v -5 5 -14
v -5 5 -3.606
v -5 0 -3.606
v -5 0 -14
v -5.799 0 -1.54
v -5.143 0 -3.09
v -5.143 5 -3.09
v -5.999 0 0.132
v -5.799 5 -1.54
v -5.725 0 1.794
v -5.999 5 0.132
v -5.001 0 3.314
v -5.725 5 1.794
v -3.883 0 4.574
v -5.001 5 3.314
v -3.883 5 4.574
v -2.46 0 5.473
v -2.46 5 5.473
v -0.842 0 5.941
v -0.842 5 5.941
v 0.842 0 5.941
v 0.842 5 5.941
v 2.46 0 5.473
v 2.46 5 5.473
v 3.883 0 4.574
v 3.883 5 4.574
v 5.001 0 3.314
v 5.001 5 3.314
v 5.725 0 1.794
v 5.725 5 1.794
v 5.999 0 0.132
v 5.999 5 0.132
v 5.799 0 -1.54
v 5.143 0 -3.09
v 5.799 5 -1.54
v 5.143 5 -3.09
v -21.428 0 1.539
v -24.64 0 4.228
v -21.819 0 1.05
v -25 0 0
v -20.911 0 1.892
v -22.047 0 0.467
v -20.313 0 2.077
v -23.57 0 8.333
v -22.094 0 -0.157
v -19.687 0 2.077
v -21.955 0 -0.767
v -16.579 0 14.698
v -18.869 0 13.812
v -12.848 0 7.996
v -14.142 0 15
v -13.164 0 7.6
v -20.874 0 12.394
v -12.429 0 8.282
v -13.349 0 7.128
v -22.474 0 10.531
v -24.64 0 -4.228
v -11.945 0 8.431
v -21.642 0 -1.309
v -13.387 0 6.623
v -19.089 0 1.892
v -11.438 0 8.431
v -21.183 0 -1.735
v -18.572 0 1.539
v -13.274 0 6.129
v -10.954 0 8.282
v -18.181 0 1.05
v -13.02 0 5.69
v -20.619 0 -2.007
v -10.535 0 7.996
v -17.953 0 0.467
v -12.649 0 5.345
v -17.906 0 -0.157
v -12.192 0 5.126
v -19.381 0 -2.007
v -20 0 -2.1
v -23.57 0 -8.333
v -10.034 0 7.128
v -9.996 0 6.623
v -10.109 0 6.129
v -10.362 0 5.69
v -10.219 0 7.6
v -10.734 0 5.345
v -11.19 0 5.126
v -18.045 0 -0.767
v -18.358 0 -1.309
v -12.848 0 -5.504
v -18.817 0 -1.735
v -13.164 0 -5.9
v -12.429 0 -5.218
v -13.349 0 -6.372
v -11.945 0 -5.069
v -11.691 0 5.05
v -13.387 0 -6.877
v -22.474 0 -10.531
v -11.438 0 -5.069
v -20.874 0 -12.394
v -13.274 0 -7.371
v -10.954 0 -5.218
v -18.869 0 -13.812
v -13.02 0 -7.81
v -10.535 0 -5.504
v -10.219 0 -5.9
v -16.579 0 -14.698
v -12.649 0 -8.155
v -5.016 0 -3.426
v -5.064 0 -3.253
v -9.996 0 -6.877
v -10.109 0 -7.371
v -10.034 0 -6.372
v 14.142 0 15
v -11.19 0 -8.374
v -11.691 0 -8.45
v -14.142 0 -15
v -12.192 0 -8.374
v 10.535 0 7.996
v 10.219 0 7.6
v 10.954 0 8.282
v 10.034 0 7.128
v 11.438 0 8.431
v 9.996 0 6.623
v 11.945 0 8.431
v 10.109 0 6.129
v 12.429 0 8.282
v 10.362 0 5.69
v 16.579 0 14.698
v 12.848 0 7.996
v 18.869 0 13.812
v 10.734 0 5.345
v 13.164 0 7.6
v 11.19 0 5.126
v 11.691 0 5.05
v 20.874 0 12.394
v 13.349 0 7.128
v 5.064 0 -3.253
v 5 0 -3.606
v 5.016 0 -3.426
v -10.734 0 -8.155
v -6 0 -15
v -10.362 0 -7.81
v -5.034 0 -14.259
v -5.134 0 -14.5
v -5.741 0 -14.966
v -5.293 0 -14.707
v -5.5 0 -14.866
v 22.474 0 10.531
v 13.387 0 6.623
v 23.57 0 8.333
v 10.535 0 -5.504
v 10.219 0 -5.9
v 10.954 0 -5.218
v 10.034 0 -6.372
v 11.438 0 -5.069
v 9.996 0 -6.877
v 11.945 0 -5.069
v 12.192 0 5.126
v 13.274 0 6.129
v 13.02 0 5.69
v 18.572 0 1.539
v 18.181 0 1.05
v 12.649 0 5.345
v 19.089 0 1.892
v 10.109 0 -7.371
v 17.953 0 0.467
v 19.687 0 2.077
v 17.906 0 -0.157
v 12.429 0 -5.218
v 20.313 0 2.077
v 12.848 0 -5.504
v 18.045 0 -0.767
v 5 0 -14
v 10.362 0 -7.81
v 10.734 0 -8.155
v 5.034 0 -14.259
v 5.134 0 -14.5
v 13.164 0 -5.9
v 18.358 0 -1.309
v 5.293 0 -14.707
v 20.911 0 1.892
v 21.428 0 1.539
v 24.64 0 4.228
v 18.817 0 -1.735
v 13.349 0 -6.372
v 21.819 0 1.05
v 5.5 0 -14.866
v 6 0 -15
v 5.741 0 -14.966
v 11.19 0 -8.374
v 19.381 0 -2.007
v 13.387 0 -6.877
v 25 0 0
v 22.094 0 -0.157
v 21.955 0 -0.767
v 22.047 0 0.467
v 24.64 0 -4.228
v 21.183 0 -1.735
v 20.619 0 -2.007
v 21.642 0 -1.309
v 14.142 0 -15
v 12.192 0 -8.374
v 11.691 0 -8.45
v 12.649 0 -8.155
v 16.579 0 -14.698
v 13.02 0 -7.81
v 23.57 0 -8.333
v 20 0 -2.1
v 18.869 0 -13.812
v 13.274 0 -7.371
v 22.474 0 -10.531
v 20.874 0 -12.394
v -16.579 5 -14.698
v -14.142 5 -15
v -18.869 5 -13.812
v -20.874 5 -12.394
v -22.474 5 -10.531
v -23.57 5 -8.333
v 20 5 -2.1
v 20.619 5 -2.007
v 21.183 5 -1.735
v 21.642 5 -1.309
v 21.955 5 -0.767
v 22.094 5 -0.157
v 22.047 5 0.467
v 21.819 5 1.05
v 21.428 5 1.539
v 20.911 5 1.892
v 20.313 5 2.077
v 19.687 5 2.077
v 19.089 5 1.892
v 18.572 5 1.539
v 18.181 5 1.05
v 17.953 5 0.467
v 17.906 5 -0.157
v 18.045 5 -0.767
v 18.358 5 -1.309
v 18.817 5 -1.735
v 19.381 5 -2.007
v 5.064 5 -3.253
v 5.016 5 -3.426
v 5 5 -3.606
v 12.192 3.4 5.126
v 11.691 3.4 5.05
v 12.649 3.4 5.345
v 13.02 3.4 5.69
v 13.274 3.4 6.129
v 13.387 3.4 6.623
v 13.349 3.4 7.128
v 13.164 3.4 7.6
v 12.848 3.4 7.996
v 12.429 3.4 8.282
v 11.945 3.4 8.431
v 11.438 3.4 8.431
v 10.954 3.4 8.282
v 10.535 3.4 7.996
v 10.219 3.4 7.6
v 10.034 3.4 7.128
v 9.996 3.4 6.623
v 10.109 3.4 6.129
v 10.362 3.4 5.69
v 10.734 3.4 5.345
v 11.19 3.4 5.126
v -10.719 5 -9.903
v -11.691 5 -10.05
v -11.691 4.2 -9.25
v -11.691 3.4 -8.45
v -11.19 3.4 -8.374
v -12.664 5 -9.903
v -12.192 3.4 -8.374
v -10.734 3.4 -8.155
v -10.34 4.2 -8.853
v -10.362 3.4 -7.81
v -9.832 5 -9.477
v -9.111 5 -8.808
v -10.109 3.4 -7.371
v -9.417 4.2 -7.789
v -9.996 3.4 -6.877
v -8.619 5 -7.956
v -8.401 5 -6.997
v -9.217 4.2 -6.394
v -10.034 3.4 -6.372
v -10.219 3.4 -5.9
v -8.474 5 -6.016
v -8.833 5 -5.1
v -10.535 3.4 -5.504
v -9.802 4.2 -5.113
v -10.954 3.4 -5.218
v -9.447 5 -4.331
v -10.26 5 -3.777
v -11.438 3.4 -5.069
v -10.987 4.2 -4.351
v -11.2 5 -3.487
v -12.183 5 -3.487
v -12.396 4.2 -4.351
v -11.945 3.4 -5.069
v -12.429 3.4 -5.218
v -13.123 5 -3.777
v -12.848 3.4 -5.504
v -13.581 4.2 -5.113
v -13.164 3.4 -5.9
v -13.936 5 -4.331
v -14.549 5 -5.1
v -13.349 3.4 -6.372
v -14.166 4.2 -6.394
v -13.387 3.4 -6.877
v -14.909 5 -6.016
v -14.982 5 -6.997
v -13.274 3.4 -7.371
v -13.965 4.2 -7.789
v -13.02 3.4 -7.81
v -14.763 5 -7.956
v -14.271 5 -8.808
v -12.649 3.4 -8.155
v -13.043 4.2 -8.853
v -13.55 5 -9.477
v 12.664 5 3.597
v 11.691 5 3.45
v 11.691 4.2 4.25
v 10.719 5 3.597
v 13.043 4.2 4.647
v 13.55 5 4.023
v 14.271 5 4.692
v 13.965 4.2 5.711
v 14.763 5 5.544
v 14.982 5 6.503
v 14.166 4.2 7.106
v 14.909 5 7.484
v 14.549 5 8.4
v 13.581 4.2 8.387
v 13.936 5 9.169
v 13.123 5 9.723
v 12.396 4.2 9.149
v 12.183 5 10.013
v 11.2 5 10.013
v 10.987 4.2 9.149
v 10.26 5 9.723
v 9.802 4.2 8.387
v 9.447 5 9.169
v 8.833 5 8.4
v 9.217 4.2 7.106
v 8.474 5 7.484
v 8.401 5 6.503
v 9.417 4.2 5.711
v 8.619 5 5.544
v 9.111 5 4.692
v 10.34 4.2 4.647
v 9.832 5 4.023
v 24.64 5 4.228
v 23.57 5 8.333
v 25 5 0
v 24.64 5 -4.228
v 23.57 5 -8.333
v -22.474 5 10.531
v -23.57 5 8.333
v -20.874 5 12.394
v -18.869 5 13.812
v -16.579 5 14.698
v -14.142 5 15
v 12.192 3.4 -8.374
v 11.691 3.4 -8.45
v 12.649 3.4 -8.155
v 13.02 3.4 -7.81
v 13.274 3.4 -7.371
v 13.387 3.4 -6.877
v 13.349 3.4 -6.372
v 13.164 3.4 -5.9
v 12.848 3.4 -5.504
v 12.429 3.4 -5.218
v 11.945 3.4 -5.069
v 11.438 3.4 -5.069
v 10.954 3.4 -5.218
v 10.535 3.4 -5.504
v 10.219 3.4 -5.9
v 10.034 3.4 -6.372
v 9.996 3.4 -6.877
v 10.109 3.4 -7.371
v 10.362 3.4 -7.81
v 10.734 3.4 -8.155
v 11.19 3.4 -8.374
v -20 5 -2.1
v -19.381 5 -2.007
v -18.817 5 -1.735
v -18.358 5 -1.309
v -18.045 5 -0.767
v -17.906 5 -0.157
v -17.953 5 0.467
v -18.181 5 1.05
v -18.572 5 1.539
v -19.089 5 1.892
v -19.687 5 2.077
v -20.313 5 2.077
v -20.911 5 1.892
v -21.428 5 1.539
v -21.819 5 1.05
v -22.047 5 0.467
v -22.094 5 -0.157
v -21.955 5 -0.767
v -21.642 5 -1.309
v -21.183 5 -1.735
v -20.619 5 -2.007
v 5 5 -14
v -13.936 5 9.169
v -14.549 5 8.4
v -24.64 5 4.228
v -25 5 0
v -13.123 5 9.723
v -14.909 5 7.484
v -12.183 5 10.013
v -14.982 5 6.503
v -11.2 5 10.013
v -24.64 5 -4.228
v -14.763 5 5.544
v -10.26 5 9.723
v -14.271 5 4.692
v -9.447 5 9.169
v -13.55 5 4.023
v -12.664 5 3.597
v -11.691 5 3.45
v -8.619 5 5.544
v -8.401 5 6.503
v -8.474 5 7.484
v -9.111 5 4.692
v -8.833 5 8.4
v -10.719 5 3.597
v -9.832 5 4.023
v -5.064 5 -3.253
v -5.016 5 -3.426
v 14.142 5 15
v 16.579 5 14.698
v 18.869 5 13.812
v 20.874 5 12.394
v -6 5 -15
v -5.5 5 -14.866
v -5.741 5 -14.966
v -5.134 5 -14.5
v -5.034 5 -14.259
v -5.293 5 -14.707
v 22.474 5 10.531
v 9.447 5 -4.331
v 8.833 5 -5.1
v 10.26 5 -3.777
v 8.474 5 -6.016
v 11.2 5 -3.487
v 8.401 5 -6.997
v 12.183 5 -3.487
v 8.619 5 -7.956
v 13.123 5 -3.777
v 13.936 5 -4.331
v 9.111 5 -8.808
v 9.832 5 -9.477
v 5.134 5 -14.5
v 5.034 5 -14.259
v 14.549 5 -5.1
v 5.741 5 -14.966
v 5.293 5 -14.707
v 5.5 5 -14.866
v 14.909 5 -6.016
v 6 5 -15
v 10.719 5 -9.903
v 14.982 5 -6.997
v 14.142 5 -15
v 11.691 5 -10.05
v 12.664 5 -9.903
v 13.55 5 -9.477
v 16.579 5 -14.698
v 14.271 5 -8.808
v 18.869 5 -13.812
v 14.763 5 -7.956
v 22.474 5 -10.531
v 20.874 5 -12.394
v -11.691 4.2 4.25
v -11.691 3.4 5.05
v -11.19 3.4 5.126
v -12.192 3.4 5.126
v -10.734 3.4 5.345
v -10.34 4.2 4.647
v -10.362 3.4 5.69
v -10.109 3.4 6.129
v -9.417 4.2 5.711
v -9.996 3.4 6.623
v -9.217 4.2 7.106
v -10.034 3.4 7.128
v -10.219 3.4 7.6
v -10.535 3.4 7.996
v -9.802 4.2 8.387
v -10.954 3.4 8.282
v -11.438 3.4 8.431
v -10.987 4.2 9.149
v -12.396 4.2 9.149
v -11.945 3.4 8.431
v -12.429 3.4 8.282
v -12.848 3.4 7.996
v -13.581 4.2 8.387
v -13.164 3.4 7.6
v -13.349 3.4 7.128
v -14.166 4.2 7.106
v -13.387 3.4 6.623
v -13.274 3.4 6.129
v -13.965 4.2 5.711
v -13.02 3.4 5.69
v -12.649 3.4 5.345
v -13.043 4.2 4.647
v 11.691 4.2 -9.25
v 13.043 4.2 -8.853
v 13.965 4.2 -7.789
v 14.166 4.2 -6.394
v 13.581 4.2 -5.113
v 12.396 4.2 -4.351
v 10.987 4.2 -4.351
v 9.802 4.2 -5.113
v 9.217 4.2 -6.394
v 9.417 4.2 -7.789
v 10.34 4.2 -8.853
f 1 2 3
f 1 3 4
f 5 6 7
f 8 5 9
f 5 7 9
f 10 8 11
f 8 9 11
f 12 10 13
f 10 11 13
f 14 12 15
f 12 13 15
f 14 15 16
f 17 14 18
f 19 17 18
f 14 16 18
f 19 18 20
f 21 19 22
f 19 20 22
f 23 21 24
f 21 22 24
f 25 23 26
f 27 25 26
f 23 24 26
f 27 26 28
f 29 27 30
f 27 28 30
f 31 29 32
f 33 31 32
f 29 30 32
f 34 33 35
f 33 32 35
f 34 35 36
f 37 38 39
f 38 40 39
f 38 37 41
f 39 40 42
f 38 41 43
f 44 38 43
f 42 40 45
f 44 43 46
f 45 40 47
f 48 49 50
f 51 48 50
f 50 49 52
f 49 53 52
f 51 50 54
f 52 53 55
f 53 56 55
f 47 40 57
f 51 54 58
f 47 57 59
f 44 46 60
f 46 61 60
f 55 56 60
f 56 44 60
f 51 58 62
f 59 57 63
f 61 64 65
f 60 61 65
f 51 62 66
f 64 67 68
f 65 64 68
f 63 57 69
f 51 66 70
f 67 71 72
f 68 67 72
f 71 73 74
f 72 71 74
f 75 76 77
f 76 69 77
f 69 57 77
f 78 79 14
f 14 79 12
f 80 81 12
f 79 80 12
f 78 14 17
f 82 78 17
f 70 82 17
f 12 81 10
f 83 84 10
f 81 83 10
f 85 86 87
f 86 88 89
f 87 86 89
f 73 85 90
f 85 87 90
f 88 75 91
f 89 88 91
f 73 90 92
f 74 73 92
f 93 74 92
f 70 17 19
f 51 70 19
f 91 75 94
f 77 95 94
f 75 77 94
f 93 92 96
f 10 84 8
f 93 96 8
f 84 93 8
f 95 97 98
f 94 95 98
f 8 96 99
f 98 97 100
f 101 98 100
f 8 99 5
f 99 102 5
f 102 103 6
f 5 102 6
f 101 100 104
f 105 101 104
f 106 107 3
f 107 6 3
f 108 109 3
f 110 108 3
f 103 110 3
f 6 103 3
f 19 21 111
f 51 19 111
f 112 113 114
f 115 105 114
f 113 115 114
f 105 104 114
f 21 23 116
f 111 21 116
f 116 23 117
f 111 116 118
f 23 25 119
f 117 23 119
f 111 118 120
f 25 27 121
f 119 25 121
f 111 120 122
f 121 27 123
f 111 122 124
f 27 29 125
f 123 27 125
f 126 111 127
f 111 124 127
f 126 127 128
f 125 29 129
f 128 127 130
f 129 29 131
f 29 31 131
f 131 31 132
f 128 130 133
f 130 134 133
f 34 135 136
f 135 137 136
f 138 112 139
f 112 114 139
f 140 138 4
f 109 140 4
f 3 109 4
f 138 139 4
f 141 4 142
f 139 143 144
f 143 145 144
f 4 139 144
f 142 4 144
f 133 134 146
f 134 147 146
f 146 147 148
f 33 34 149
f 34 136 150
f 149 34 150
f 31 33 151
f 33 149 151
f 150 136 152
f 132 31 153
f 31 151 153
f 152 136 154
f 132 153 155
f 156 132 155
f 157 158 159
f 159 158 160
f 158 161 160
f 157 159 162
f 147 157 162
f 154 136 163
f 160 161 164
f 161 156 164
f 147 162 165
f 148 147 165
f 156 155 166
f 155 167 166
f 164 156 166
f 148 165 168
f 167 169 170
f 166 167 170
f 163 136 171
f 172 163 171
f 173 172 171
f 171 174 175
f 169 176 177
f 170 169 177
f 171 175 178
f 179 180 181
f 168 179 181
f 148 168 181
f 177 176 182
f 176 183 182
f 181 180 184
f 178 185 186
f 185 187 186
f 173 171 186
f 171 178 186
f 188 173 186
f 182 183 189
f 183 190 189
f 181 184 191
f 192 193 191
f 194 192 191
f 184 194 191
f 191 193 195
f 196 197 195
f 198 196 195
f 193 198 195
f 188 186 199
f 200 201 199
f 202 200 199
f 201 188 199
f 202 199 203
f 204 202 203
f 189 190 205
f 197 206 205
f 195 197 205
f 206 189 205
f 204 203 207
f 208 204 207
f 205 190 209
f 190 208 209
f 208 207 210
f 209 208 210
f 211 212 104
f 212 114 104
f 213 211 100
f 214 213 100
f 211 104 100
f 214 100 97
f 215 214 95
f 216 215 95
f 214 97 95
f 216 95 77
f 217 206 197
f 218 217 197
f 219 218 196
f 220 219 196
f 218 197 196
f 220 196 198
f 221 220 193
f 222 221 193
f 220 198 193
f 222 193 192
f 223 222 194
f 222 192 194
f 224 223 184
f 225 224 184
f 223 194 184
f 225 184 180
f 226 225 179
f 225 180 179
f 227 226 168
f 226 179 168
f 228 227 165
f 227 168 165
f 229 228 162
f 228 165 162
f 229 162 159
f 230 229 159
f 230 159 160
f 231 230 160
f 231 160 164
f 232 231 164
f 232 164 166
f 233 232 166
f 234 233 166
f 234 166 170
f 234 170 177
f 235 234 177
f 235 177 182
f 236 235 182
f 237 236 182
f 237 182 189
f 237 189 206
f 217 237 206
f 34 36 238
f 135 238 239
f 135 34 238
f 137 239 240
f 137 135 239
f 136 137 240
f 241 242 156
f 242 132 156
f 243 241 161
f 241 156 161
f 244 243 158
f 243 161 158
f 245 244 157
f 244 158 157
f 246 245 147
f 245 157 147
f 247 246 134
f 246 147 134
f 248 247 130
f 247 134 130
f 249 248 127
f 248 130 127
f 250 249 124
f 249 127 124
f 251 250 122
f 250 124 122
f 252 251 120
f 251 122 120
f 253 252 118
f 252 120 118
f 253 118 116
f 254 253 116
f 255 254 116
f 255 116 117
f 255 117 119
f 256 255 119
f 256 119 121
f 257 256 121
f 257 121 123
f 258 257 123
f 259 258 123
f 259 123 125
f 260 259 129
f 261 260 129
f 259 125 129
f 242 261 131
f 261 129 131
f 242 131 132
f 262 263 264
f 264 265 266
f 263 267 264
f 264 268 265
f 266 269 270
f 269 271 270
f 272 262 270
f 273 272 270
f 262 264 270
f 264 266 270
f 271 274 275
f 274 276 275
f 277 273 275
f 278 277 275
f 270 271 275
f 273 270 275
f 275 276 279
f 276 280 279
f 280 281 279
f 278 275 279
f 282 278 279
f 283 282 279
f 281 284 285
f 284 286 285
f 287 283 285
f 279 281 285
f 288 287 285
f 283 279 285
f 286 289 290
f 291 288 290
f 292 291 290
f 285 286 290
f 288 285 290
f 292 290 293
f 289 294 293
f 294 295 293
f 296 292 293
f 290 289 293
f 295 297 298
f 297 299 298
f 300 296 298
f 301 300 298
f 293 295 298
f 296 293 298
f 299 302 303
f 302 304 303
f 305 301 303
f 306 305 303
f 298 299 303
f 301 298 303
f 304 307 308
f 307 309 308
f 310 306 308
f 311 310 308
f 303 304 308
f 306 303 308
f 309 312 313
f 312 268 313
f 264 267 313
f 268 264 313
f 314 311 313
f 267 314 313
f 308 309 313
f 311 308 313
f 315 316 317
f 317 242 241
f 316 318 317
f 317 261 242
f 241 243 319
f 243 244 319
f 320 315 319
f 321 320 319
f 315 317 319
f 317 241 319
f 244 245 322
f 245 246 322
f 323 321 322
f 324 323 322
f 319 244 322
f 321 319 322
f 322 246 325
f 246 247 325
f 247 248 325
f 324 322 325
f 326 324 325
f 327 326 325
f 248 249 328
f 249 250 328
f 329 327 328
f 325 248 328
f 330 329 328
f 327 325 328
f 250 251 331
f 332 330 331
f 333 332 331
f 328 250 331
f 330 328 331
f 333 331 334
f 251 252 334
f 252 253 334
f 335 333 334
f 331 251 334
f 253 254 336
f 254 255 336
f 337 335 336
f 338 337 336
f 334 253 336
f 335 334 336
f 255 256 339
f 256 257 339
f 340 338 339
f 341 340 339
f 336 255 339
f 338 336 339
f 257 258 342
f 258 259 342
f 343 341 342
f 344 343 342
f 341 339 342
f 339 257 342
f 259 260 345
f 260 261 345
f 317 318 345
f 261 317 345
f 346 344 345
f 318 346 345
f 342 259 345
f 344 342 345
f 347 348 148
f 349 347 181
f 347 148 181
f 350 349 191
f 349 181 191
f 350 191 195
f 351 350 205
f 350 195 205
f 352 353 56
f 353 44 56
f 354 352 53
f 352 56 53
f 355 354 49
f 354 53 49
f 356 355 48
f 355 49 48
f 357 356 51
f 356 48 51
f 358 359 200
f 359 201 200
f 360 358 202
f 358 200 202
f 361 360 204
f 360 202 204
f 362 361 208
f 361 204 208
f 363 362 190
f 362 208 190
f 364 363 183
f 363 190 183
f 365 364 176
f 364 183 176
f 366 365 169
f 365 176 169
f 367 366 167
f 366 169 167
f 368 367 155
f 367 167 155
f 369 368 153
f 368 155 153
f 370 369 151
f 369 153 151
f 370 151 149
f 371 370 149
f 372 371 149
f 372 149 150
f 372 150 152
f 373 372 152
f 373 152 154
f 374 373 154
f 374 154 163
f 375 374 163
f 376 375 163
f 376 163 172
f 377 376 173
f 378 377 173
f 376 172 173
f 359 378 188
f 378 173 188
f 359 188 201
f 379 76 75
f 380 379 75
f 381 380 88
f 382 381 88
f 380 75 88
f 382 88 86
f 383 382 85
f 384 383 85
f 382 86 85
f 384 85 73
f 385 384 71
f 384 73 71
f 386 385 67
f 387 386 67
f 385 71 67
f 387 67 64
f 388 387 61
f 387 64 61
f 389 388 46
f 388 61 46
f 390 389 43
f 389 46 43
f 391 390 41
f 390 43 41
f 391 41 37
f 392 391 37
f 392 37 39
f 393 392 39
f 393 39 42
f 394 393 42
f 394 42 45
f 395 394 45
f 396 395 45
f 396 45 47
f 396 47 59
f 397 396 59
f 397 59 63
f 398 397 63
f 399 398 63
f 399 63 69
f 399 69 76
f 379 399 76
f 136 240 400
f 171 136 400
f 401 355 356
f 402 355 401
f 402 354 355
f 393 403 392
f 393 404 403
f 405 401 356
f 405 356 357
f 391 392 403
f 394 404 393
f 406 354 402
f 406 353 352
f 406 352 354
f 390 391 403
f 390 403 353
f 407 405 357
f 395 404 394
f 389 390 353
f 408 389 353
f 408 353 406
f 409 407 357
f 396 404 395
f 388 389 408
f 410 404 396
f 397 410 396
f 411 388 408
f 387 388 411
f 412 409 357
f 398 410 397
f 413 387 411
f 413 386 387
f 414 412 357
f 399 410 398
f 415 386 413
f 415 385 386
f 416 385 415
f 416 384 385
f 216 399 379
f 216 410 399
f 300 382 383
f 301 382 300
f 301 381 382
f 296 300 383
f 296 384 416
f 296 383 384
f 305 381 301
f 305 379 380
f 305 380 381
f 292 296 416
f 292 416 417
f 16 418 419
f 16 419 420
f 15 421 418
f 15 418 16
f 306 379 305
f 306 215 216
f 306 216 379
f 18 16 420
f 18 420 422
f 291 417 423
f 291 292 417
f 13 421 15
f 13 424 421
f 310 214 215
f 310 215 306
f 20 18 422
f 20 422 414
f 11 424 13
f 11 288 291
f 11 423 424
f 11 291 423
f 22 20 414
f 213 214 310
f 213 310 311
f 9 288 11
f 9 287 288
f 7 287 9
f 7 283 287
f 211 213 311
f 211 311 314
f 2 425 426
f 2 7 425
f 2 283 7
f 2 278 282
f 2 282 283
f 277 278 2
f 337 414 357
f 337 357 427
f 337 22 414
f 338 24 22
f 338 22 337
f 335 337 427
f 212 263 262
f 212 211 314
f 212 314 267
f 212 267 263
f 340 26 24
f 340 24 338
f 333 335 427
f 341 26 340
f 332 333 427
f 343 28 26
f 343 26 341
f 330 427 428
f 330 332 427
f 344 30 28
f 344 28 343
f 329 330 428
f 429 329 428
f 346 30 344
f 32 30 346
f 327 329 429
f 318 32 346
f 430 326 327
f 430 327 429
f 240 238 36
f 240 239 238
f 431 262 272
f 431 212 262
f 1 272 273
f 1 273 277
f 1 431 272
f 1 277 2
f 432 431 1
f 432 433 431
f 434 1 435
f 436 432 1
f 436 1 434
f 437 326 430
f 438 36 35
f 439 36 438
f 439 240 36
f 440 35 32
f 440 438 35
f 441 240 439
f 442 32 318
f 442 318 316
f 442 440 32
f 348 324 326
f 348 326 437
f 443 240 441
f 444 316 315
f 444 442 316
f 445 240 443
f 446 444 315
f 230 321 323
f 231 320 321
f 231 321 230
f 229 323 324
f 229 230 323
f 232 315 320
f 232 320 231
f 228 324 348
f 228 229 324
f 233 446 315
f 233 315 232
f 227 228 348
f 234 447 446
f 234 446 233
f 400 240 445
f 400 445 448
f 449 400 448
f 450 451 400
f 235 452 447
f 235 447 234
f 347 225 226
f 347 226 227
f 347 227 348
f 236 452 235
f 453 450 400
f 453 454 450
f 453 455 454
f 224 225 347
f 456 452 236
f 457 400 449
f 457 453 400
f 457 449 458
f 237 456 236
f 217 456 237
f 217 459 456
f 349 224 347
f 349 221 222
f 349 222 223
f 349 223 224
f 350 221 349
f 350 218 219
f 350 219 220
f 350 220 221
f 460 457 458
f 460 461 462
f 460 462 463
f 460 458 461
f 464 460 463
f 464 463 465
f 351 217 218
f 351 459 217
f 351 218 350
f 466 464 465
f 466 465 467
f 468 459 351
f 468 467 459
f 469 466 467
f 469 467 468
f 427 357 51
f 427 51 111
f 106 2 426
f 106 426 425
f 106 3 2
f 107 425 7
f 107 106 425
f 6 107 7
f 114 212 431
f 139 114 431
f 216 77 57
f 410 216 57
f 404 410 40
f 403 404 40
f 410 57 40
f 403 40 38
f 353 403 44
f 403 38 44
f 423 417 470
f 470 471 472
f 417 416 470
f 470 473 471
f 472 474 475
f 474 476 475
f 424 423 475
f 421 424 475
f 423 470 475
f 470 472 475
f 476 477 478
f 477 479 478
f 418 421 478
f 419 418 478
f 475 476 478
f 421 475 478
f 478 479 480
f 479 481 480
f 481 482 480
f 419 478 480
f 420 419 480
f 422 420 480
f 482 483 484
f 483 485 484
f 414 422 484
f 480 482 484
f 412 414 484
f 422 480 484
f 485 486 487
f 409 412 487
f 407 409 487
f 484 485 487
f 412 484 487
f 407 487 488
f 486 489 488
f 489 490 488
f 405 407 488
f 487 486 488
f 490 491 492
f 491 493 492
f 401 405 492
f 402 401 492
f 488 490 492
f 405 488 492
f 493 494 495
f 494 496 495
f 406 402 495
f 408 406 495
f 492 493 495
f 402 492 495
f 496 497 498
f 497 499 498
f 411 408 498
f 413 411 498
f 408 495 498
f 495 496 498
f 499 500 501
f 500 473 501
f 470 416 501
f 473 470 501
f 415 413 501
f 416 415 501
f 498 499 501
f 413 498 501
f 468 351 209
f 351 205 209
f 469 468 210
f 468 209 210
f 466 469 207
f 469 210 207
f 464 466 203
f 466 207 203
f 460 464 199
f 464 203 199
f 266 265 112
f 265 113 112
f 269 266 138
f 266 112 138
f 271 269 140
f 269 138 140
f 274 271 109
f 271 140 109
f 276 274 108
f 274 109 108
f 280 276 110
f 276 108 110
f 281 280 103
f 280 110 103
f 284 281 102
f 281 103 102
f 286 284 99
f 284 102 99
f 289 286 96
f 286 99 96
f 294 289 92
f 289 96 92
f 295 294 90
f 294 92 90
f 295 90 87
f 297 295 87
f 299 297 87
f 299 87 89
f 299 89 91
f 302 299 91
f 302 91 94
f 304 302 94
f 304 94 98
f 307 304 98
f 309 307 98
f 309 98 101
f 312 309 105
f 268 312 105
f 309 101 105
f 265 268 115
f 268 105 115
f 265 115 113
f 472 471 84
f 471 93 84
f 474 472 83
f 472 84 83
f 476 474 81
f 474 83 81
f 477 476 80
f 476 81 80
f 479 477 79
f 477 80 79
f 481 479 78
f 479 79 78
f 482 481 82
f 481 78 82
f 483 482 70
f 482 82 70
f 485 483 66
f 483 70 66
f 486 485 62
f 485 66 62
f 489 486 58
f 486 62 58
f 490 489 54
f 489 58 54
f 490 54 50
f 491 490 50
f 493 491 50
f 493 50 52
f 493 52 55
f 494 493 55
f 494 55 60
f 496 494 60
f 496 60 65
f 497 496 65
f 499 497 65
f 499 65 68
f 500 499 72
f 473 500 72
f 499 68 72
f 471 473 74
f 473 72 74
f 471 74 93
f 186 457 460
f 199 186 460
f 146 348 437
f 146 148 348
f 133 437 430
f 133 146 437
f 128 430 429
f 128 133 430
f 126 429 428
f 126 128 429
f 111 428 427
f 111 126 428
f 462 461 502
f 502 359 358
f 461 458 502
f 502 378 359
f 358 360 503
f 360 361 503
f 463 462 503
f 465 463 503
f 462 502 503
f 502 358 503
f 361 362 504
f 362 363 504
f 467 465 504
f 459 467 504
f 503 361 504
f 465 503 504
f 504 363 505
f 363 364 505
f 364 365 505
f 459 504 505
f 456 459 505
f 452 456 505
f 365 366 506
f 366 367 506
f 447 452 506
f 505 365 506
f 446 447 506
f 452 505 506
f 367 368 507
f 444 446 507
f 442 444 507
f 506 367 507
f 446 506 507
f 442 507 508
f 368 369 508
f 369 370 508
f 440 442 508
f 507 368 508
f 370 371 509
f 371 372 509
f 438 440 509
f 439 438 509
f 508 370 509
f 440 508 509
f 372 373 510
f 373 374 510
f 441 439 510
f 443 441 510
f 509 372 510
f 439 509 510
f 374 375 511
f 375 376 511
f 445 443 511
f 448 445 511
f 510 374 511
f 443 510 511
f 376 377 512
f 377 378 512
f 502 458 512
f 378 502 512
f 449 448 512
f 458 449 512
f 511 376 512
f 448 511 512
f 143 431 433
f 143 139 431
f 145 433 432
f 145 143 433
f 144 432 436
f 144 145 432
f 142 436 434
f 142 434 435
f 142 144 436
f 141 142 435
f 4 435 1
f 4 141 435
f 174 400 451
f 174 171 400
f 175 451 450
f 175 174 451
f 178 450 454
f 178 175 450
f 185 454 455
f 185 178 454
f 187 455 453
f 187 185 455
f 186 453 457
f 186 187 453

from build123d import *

# Parameters (mm, degrees)
SKETCH_1_R                   = 25
EXTRUDE_1_DEPTH              = 5
SKETCH_2_R                   = 1
CUT_EXTRUDE_1_DEPTH          = 4
HOLE_WIZARD_M3_1_D           = 3.4
HOLE_WIZARD_M3_1_DEPTH       = 7.5
HOLE_WIZARD_M3_1_CSINK_D     = 6.6
HOLE_WIZARD_M3_1_CSINK_ANGLE = 90
HOLE_WIZARD_M3_1_TIP         = 1.021463052
SKETCH_4_R                   = 2
CUT_EXTRUDE_2_DEPTH          = 4
HOLE_WIZARD_M5_1_D           = 4.2
HOLE_WIZARD_M5_1_DEPTH       = 12.4
HOLE_WIZARD_M5_1_TIP         = 1.2618073
SKETCH_7_W                   = 78.33195998
SKETCH_7_H                   = 10
CUT_EXTRUDE_3_DEPTH          = 6
FILLET_1_R                   = 10
SKETCH_9_R                   = 6
CUT_EXTRUDE_5_DEPTH          = 10
SKETCH_10_W                  = 10
SKETCH_10_H                  = 11.68337521
CUT_EXTRUDE_6_DEPTH          = 10
FILLET_2_R                   = 1


with BuildPart() as part:
    # 草图1 → 凸台-拉伸1 (new body)
    with BuildSketch(Plane(origin=(0, 0, 0), x_dir=(1, 0, 0), z_dir=(0, 1, 0))):
        Circle(SKETCH_1_R)
    extrude(amount=EXTRUDE_1_DEPTH)

    # 草图2 → 切除-拉伸1 (cut)
    with BuildSketch(Plane(origin=(0, 5, 0), x_dir=(1, 0, 0), z_dir=(0, 1, 0))):
        with Locations((11.691342951, 6.75)):
            Circle(SKETCH_2_R)
        with Locations((11.691342951, -6.75)):
            Circle(SKETCH_2_R)
        with Locations((-11.691342951, -6.75)):
            Circle(SKETCH_2_R)
        with Locations((-11.691342951, 6.75)):
            Circle(SKETCH_2_R)
    extrude(amount=-CUT_EXTRUDE_1_DEPTH, mode=Mode.SUBTRACT)

    # M3 十字槽沉头木螺钉的锥形沉头孔1
    with Locations(Plane(origin=(11.691342951, 5, -6.75), x_dir=(0, 0, 1), z_dir=(0, 1, 0))):
        with Locations((0, 0), (13.5, 0), (13.5, -23.382685902), (0, -23.382685902)):
            CounterSinkHole(HOLE_WIZARD_M3_1_D / 2, HOLE_WIZARD_M3_1_CSINK_D / 2, depth=HOLE_WIZARD_M3_1_DEPTH, counter_sink_angle=HOLE_WIZARD_M3_1_CSINK_ANGLE)
            with Locations((0, 0, -(HOLE_WIZARD_M3_1_DEPTH + HOLE_WIZARD_M3_1_TIP / 2))):  # 118° drill point
                Cone(0, HOLE_WIZARD_M3_1_D / 2, HOLE_WIZARD_M3_1_TIP, mode=Mode.SUBTRACT)

    # 草图4 → 切除-拉伸2 (cut)
    with BuildSketch(Plane(origin=(0, 5, 0), x_dir=(1, 0, 0), z_dir=(0, 1, 0))):
        with Locations((-20, 0)):
            Circle(SKETCH_4_R)
        with Locations((20, 0)):
            Circle(SKETCH_4_R)
    extrude(amount=-CUT_EXTRUDE_2_DEPTH, mode=Mode.SUBTRACT)

    # M5 螺纹孔1
    with Locations(Plane(origin=(-20, 5, 0), x_dir=(0, 0, 1), z_dir=(0, 1, 0))):
        with Locations((0, 0), (0, 40)):
            Hole(HOLE_WIZARD_M5_1_D / 2, depth=HOLE_WIZARD_M5_1_DEPTH)
            with Locations((0, 0, -(HOLE_WIZARD_M5_1_DEPTH + HOLE_WIZARD_M5_1_TIP / 2))):  # 118° drill point
                Cone(0, HOLE_WIZARD_M5_1_D / 2, HOLE_WIZARD_M5_1_TIP, mode=Mode.SUBTRACT)

    # 草图7 → 切除-拉伸3 (cut, through all)
    with BuildSketch(Plane(origin=(0, 5, 0), x_dir=(1, 0, 0), z_dir=(0, 1, 0))):
        with Locations((0, 20)):
            Rectangle(SKETCH_7_W, SKETCH_7_H)
        with Locations((0, -20)):
            Rectangle(SKETCH_7_W, SKETCH_7_H)
    extrude(amount=-CUT_EXTRUDE_3_DEPTH, mode=Mode.SUBTRACT)

    # 圆角1
    fillet_1_edges = [part.edges().sort_by_distance(p)[0] for p in [
        (20, 2.5, 15),
        (-20, 2.5, 15),
        (-20, 2.5, -15),
        (20, 2.5, -15),
    ]]
    fillet(fillet_1_edges, radius=FILLET_1_R)

    # 草图9 → 切除-拉伸5 (cut)
    with BuildSketch(Plane(origin=(0, 5, 0), x_dir=(1, 0, 0), z_dir=(0, 1, 0))):
        Circle(SKETCH_9_R)
    extrude(amount=-CUT_EXTRUDE_5_DEPTH, mode=Mode.SUBTRACT)

    # 草图10 → 切除-拉伸6 (cut)
    with BuildSketch(Plane(origin=(0, 5, 0), x_dir=(1, 0, 0), z_dir=(0, 1, 0))):
        with Locations((0, 9.158312395)):
            Rectangle(SKETCH_10_W, SKETCH_10_H)
    extrude(amount=-CUT_EXTRUDE_6_DEPTH, mode=Mode.SUBTRACT)

    # 圆角2
    fillet_2_edges = [part.edges().sort_by_distance(p)[0] for p in [
        (-5, 2.5, -3.31662479),
        (5, 2.5, -3.31662479),
        (-5, 2.5, -15),
        (5, 2.5, -15),
    ]]
    fillet(fillet_2_edges, radius=FILLET_2_R)


solid = part.part
